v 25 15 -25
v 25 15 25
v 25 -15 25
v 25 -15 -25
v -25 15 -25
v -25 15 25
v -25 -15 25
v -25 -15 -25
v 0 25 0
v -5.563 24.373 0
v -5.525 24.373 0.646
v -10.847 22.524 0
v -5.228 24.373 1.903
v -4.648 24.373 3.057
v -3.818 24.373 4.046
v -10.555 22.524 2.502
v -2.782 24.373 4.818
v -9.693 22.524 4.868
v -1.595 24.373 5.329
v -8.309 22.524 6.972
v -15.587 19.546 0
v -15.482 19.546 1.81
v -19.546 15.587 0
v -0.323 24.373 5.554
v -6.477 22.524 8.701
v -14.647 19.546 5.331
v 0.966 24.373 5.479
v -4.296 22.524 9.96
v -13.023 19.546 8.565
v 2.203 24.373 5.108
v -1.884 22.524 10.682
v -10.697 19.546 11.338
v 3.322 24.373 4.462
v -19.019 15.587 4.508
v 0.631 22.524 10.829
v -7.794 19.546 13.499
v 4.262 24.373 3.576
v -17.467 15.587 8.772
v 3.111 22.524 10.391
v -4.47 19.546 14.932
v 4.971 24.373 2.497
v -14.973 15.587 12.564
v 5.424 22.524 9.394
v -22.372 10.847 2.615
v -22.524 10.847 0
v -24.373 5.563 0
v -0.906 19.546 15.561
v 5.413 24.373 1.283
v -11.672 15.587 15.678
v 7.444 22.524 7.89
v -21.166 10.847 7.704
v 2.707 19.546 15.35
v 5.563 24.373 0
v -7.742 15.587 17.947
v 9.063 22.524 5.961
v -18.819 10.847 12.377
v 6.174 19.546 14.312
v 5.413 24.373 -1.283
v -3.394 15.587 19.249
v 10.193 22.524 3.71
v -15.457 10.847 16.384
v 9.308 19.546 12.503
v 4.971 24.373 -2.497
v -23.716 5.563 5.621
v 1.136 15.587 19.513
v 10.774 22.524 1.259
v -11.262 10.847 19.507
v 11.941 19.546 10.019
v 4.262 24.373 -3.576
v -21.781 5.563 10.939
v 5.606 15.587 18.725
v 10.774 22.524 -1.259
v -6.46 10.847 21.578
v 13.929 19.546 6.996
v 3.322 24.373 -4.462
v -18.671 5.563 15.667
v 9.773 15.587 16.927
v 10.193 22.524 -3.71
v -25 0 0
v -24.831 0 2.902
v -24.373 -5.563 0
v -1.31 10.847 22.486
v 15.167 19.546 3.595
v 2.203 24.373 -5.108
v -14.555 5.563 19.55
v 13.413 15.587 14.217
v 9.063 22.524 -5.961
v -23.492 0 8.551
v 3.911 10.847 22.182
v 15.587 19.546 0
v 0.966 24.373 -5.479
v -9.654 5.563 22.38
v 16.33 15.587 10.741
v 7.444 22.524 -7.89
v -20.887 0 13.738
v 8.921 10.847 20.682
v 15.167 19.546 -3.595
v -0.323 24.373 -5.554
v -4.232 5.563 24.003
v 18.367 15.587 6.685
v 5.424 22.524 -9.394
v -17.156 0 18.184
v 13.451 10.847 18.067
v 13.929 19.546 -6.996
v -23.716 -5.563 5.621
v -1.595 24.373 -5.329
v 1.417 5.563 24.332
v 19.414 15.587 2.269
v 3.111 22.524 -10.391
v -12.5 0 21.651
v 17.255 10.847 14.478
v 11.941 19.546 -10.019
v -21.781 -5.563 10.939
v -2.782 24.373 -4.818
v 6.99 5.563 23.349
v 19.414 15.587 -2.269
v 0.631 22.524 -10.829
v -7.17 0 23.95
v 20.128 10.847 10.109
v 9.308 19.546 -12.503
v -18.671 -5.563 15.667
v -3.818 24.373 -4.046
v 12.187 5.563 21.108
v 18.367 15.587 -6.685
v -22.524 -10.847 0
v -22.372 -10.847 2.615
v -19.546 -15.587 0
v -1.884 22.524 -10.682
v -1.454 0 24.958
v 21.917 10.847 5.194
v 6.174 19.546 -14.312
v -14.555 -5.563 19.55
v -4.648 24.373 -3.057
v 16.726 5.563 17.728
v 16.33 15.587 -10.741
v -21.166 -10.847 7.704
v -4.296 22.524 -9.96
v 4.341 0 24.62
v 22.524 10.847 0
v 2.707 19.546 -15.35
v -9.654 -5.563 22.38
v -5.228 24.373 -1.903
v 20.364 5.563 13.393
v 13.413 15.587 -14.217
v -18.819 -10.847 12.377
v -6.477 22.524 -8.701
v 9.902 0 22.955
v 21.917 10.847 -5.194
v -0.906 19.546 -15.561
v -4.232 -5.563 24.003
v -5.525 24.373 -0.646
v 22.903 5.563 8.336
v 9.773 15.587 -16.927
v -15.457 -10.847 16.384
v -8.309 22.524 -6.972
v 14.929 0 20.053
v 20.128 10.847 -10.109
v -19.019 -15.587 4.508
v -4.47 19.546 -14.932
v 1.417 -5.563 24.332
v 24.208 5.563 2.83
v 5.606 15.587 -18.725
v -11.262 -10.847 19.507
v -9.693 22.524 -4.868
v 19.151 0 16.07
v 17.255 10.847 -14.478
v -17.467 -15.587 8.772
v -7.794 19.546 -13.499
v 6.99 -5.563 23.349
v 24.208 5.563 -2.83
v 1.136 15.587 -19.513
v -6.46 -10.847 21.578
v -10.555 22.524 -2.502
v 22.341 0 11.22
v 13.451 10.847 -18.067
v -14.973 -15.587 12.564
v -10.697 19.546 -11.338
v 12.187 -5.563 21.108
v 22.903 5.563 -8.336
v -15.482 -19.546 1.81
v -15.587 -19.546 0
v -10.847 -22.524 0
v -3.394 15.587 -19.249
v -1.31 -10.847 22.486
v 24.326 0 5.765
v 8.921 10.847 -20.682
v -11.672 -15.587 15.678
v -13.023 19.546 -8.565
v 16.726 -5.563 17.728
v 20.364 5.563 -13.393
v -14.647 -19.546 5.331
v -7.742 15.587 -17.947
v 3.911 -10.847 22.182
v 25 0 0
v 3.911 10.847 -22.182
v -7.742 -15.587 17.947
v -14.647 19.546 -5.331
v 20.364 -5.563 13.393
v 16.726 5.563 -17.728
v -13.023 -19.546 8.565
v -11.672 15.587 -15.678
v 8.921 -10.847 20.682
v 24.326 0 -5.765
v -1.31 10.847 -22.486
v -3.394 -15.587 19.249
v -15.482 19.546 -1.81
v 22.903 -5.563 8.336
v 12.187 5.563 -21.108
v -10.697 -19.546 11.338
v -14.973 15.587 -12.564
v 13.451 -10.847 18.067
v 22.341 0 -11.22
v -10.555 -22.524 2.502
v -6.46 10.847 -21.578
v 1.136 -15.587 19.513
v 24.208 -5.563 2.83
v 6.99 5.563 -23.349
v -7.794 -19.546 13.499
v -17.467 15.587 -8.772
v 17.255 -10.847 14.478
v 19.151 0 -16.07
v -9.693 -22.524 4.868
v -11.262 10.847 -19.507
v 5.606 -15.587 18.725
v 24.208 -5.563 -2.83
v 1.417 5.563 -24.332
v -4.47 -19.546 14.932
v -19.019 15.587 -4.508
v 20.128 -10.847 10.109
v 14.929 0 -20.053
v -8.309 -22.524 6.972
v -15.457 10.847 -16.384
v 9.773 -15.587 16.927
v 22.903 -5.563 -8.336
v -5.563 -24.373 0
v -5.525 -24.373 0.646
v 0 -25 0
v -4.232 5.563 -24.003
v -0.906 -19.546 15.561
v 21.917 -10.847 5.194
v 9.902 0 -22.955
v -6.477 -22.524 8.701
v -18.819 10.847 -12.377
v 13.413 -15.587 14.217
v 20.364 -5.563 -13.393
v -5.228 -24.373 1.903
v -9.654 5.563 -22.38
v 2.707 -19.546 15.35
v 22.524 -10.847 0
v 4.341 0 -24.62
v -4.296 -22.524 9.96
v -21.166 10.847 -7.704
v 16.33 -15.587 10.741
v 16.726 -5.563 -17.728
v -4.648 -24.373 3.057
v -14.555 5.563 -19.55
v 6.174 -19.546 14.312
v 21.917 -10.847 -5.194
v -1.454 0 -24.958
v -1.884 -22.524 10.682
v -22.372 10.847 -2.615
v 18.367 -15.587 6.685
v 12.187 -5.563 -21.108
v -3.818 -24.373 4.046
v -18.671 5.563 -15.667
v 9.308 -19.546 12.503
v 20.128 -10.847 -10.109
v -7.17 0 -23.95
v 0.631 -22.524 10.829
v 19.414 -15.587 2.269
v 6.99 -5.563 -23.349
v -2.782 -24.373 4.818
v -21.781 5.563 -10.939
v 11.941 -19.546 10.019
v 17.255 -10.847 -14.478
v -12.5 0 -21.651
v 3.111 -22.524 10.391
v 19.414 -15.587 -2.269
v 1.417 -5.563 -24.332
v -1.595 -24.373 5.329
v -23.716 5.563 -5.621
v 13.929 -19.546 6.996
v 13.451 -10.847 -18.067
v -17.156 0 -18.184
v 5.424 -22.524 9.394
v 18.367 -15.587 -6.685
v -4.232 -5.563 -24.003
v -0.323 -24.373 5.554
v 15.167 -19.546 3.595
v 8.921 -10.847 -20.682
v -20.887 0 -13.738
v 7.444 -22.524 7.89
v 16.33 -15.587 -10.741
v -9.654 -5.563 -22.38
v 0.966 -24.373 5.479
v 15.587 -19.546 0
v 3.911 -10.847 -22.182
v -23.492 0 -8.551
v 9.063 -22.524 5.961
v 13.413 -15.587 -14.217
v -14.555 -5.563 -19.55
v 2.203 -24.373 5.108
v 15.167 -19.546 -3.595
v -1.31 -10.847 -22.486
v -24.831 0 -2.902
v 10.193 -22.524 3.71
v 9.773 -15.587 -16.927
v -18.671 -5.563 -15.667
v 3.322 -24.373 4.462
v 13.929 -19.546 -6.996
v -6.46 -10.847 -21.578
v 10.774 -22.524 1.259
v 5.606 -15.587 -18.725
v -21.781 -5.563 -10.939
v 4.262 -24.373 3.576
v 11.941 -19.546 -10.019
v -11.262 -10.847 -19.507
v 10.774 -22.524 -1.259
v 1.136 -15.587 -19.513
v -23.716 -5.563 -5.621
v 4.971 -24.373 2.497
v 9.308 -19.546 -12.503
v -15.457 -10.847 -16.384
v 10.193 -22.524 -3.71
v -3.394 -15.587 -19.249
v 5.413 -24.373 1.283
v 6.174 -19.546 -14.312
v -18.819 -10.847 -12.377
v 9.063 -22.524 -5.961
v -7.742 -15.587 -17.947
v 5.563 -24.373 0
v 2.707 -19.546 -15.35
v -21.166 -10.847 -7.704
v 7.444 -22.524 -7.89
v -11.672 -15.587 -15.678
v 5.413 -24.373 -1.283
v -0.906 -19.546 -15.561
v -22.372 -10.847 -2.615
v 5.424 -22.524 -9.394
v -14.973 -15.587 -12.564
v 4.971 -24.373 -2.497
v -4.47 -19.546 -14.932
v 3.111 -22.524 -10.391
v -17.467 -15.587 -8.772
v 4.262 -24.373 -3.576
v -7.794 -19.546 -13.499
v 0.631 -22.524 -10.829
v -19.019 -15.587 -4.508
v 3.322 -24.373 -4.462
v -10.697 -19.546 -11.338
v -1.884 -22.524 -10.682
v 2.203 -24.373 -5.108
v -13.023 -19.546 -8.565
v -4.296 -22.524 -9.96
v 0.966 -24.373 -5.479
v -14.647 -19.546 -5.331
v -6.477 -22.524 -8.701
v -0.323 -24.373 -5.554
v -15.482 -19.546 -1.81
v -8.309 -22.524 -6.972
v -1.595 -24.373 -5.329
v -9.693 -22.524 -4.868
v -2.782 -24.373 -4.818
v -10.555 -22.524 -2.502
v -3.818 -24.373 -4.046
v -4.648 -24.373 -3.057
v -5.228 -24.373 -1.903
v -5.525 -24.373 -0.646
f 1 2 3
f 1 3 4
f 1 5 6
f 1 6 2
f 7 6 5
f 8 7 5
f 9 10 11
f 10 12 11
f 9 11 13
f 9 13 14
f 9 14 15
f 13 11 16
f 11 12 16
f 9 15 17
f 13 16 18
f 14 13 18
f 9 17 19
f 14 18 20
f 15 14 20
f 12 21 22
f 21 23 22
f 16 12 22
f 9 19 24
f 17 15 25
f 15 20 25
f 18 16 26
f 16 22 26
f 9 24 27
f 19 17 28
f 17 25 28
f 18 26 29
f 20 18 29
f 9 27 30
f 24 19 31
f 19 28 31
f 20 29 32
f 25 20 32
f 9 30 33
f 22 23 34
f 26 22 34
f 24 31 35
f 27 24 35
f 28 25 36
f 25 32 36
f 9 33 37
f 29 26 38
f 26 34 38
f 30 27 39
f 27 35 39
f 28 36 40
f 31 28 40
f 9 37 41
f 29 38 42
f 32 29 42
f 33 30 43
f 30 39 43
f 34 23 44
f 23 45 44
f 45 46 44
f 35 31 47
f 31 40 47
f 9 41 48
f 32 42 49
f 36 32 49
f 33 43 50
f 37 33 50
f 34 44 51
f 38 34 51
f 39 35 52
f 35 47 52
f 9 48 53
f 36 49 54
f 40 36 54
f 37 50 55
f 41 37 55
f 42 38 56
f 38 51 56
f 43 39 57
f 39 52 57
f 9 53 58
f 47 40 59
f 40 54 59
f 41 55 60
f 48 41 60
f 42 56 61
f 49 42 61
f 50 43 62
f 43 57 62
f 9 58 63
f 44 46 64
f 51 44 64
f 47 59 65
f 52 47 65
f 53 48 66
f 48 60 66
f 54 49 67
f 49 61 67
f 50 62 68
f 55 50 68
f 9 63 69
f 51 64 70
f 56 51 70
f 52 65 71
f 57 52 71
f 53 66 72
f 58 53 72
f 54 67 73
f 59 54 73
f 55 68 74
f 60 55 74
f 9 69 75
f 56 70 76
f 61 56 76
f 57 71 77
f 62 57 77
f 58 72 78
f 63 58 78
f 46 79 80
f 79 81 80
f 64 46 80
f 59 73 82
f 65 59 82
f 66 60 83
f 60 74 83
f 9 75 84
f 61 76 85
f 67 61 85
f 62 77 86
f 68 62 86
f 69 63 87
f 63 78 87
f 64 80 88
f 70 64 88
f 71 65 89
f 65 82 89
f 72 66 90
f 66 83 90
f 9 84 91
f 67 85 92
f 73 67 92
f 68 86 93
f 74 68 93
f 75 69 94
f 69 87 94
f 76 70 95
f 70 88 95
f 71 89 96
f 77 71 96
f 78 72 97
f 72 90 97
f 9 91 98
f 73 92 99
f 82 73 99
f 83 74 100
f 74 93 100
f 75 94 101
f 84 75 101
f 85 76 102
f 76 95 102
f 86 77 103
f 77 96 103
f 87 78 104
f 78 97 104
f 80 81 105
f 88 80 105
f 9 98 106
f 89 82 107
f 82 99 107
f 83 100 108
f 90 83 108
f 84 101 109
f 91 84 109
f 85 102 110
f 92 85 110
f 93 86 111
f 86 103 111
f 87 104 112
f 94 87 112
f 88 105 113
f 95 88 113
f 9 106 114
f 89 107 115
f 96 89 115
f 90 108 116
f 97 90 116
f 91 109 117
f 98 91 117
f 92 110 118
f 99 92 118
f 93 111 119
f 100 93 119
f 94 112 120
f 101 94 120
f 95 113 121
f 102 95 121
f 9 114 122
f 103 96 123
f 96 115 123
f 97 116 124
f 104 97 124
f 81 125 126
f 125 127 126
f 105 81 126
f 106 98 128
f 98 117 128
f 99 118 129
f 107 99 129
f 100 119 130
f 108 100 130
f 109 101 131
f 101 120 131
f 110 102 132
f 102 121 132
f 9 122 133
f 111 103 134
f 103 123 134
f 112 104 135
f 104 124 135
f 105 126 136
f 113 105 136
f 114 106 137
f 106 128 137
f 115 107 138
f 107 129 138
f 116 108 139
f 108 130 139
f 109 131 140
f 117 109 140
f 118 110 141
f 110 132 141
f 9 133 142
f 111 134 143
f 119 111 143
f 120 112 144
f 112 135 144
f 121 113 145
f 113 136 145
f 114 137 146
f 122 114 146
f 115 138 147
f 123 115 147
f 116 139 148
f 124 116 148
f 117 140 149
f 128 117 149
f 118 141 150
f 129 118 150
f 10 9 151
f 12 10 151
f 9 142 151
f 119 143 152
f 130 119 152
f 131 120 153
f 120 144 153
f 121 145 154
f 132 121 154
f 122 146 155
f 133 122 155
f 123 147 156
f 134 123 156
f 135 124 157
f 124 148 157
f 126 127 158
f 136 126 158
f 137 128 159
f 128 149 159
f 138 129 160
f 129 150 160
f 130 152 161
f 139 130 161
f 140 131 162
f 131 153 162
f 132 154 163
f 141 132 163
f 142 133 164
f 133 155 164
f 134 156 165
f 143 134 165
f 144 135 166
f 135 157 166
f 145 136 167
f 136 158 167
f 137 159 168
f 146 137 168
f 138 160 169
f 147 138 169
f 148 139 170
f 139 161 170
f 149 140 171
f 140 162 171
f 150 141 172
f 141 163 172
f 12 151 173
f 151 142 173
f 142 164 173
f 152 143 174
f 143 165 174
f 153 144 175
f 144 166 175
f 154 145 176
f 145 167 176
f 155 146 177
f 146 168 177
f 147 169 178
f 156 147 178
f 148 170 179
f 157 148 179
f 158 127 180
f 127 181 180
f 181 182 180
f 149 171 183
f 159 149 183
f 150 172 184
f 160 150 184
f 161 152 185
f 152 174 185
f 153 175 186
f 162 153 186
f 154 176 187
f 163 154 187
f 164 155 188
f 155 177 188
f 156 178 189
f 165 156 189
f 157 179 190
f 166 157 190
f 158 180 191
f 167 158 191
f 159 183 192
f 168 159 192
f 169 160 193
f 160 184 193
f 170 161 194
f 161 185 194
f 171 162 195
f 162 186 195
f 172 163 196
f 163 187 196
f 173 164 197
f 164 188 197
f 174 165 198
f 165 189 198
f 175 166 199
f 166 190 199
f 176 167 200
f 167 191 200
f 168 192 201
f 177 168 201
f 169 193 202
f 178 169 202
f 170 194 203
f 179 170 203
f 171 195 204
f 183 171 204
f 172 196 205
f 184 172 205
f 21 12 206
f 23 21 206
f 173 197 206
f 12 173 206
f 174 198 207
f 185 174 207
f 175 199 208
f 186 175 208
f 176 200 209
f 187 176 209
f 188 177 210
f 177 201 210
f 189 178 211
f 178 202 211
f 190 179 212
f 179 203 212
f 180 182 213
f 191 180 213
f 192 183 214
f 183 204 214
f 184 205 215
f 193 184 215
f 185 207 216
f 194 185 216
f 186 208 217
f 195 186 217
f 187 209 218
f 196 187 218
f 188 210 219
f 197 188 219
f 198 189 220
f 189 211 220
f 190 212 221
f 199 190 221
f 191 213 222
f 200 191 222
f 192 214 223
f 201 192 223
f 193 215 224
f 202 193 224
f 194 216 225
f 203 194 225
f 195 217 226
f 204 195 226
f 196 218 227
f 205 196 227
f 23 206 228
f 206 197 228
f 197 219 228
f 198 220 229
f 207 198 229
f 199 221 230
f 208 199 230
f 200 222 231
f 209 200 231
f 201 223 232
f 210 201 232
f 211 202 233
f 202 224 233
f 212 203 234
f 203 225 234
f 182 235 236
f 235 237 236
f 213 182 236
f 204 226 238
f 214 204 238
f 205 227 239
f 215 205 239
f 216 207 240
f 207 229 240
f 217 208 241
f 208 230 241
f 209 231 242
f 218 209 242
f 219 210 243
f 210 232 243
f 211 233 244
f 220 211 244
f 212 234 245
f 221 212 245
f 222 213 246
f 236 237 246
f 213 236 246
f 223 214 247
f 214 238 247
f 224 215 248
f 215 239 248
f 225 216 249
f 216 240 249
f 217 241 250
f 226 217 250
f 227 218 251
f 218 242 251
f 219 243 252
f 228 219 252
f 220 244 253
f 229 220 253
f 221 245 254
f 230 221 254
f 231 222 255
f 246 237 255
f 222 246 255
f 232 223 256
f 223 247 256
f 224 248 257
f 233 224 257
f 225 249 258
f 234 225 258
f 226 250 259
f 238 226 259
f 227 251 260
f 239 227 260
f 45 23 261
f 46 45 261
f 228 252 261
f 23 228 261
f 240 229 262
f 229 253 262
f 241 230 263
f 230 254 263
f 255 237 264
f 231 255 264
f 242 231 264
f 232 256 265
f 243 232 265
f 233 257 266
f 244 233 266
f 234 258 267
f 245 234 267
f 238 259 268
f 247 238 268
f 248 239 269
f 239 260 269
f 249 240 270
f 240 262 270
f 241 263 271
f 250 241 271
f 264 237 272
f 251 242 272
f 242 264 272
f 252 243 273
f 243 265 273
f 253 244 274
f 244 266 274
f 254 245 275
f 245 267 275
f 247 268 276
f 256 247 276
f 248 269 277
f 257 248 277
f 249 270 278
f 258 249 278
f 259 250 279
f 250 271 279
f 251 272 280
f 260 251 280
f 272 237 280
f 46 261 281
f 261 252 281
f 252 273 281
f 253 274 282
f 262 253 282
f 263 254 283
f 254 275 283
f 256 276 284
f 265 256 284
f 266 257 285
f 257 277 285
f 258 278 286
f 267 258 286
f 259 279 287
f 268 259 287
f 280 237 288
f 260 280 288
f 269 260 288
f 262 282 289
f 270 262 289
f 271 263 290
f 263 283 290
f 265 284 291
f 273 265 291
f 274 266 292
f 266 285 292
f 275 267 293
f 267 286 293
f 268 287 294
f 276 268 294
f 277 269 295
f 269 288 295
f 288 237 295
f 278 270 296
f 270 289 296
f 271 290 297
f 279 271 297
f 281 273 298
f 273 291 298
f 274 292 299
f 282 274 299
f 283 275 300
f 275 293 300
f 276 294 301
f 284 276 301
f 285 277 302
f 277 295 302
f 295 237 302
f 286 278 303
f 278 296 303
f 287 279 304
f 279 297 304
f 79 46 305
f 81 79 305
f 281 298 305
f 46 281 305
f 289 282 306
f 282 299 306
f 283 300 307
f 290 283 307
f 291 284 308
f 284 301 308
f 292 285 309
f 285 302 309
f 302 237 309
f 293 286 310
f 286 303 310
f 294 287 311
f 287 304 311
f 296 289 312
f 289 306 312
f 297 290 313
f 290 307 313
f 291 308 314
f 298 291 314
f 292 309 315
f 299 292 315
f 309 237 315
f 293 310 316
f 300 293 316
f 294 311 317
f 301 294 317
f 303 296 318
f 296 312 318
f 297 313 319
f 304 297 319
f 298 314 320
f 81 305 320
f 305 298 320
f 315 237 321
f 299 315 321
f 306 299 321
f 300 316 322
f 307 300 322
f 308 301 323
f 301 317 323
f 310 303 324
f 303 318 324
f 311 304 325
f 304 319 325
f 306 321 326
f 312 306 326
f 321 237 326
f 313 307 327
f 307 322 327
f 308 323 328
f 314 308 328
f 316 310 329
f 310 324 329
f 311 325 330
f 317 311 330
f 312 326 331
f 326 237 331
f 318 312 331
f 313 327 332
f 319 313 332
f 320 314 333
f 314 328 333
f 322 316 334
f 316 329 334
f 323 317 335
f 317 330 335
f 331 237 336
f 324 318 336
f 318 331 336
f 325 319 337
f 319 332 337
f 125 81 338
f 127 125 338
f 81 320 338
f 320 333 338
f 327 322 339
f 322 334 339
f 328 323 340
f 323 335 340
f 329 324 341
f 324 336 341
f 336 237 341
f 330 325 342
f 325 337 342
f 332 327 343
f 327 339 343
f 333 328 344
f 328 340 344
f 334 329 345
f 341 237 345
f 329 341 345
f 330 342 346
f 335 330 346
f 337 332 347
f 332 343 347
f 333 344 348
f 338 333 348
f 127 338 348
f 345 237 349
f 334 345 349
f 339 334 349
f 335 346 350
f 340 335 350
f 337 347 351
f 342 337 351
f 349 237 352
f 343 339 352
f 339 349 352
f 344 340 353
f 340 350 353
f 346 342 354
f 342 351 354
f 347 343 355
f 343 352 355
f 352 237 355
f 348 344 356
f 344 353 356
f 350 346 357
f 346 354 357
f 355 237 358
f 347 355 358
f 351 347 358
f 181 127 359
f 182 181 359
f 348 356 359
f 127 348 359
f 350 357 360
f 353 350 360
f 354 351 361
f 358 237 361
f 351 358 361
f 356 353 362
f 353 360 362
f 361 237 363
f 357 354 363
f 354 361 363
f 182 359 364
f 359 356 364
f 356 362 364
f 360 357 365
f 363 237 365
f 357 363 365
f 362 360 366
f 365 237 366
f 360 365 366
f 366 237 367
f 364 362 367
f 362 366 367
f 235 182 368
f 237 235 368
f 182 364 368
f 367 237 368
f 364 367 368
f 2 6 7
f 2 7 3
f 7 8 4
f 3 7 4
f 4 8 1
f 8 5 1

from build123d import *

# Parameters (mm, degrees)
SKIZZE2_W                       = 50
SKIZZE2_H                       = 50
AUFSATZ_LINEAR_AUSTRAGEN1_DEPTH = 15


with BuildPart() as part:
    # Skizze1 → Rotation1 (revolve)
    with BuildSketch(Plane.XY):
        with BuildLine():
            Line((0, 0), (0, 25))
            ThreePointArc((0, 25), (-25, 0), (0, -25))
            Line((0, -25), (0, 0))
        make_face()
    revolve(axis=Axis((0, 0, 0), (0, 1, 0)))


with BuildPart() as body_2:
    # Skizze2 → Aufsatz-Linear austragen1 (new body, symmetric)
    with BuildSketch(Plane(origin=(0, 0, 0), x_dir=(1, 0, 0), z_dir=(0, 1, 0))):
        Rectangle(SKIZZE2_W, SKIZZE2_H)
    extrude(amount=AUFSATZ_LINEAR_AUSTRAGEN1_DEPTH, both=True)


solid = Compound([part.part, body_2.part])
